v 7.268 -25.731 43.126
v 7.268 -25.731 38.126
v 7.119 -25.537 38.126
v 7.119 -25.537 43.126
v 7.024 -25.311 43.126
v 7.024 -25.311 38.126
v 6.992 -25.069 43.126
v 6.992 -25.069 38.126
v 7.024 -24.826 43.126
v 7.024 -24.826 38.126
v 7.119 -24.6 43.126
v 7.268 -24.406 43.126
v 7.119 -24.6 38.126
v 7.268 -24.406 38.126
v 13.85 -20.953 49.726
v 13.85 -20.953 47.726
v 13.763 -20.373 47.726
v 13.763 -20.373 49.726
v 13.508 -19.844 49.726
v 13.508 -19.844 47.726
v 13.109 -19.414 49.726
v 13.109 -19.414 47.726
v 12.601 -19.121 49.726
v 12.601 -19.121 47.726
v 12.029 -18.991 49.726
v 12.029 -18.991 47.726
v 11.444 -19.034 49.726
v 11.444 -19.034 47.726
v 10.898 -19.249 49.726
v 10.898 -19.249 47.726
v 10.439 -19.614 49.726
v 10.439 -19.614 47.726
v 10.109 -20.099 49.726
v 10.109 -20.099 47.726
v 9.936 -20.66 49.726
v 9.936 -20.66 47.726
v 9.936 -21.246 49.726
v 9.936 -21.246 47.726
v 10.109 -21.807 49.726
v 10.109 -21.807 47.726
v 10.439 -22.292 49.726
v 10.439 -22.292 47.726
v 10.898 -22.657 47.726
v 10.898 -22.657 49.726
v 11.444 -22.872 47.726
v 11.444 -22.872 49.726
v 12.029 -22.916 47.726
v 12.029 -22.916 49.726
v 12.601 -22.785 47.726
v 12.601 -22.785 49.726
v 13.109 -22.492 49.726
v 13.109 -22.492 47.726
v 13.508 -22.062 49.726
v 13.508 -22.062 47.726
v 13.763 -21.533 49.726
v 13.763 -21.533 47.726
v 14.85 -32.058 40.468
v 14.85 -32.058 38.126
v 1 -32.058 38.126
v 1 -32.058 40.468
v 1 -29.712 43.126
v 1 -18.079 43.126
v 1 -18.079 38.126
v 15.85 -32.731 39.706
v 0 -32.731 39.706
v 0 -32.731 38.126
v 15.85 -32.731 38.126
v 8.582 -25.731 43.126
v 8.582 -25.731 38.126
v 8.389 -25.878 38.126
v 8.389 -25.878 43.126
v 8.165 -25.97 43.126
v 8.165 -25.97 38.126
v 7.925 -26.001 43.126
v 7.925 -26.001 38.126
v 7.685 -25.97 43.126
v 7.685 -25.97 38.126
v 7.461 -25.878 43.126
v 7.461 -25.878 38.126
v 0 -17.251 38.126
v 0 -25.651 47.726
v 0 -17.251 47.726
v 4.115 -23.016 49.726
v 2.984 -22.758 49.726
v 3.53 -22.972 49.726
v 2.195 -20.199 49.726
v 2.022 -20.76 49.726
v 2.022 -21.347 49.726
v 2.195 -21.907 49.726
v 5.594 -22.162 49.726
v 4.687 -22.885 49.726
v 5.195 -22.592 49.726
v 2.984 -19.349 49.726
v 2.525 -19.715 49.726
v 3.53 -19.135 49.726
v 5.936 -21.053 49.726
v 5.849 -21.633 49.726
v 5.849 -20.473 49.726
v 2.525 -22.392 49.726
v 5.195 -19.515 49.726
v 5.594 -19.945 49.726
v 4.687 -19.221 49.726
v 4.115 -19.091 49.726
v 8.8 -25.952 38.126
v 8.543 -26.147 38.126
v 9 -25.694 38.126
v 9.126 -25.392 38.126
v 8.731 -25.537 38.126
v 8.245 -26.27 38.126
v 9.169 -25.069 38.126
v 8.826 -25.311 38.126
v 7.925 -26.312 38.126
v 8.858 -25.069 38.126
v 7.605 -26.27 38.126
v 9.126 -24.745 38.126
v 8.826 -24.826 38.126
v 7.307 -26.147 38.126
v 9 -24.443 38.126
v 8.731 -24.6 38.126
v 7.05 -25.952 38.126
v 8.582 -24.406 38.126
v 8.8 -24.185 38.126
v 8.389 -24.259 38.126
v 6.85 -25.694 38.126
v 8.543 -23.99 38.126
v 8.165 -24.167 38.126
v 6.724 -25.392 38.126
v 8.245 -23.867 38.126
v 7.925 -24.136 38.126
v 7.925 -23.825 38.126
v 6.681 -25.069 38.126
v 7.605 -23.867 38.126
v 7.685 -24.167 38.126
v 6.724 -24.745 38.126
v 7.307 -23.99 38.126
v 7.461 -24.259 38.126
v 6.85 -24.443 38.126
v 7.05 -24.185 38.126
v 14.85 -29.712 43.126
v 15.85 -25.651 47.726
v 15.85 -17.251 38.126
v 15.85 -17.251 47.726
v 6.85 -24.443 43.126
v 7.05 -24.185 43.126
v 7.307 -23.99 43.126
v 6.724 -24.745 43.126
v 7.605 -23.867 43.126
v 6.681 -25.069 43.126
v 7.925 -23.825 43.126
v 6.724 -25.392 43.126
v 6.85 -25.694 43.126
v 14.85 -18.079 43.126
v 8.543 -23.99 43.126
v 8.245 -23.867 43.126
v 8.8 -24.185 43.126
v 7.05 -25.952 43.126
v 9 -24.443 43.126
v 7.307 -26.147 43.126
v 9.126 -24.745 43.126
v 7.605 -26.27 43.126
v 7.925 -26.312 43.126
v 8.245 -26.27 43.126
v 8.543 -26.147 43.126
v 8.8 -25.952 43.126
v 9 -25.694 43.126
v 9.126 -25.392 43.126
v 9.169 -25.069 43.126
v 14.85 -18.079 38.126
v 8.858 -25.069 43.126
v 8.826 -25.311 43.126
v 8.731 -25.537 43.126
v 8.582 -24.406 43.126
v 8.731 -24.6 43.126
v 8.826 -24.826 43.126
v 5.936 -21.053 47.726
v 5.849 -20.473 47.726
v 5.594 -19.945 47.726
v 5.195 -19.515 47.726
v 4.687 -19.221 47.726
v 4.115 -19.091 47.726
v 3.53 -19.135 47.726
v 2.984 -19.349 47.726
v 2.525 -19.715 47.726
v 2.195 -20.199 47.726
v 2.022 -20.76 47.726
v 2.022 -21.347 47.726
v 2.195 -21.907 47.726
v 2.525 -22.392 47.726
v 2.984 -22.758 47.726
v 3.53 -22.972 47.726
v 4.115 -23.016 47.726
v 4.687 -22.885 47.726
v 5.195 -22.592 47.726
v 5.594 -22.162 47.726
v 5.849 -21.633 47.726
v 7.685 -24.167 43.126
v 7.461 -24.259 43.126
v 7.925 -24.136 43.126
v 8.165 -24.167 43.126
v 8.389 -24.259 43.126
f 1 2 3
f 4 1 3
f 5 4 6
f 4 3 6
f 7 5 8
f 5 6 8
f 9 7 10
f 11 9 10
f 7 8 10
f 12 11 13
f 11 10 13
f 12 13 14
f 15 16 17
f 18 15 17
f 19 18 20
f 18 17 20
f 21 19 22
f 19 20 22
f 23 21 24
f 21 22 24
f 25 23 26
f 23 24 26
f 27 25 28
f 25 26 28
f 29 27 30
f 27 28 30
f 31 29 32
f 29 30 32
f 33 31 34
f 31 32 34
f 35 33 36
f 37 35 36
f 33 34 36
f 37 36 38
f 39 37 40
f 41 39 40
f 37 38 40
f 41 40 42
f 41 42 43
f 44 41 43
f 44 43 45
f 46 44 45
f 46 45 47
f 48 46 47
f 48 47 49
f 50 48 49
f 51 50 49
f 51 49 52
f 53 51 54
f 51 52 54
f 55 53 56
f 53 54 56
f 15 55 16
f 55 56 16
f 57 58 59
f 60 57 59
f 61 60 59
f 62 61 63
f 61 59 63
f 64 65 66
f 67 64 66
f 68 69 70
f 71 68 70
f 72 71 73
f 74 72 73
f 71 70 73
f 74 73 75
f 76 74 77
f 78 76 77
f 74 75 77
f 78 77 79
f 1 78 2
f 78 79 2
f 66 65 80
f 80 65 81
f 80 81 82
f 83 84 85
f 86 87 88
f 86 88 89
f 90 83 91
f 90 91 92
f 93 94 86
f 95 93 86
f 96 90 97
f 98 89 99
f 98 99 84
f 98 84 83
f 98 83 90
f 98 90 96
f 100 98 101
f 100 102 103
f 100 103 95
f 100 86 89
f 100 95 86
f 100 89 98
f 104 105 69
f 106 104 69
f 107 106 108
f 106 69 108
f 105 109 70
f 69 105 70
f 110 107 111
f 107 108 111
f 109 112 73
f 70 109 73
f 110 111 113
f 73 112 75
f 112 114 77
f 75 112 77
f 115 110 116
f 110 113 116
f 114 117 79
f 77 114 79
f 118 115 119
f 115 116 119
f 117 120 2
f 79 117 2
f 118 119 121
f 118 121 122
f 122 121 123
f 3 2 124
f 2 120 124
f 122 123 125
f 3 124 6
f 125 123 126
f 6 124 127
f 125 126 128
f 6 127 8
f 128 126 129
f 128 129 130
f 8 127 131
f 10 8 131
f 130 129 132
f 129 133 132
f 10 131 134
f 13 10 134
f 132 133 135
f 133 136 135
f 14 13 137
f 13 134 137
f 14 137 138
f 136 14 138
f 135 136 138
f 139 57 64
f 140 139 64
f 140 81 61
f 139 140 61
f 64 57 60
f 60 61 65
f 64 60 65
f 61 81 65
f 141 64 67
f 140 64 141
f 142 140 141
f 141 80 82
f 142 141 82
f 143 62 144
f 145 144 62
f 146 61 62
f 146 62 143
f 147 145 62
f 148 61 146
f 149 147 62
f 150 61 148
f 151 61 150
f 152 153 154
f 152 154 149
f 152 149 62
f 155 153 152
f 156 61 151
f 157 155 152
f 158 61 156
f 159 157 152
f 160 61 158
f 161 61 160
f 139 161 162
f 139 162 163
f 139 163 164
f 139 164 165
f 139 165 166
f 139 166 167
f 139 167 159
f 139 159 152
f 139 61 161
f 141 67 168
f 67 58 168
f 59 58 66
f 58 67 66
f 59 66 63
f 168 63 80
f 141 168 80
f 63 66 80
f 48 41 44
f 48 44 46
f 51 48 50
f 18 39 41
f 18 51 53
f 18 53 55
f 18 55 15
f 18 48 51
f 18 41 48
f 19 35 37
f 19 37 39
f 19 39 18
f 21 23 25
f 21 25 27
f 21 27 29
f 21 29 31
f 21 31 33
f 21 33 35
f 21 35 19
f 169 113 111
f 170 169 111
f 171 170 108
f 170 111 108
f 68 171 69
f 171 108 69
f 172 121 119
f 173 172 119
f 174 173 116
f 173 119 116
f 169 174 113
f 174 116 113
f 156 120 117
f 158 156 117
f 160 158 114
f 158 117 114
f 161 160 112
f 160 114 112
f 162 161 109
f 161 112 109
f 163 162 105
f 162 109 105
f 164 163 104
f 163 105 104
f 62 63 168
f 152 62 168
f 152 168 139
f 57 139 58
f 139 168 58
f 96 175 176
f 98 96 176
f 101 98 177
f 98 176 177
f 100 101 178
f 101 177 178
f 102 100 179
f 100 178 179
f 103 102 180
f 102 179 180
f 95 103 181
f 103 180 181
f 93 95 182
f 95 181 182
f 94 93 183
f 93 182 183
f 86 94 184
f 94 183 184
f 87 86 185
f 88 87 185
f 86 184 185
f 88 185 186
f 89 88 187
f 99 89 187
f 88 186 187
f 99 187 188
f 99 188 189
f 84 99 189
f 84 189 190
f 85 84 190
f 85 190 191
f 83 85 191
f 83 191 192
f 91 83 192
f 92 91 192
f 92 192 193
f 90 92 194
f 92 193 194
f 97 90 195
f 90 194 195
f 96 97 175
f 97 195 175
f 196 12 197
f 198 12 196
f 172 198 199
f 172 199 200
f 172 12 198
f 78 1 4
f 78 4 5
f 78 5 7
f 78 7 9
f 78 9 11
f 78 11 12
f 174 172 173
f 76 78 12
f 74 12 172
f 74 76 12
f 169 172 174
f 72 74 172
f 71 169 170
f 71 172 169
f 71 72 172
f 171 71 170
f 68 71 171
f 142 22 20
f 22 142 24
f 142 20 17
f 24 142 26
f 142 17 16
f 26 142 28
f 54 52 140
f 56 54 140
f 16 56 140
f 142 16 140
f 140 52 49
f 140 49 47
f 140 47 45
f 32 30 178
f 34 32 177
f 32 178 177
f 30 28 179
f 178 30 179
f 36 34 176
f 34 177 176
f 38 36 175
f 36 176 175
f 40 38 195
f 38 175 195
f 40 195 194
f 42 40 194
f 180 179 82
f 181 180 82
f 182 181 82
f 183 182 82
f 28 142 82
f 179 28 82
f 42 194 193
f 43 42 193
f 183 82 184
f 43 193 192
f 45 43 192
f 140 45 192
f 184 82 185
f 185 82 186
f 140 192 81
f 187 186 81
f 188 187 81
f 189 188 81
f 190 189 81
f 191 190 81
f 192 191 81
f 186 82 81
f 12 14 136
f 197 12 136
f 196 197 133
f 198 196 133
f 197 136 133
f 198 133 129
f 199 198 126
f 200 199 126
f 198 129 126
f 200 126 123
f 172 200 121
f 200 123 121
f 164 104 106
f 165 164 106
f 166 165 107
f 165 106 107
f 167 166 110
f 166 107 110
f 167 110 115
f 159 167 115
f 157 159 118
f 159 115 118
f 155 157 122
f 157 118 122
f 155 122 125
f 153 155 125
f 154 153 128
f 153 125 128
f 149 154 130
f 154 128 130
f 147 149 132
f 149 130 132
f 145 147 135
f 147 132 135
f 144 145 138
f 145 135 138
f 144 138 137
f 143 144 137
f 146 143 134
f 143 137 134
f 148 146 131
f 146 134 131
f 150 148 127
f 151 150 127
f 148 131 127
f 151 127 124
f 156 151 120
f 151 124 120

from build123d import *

# Parameters (mm, degrees)
F1_DEPTH = 15.85
F2_R     = 1.9679985055
F2_R_2   = 1.968
F3_DEPTH = 2
F5_DEPTH = 5


with BuildPart() as f1:
    # F0 (on Right) → F1 (new body)
    with BuildSketch(Plane.YZ):
        Polygon((-17.2513356102, 38.1256241769), (-17.2513356102, 47.7256241769), (-25.6513356102, 47.7256241769), (-32.7313356102, 39.7056241769), (-32.7313356102, 38.1256241769), align=None)
    extrude(amount=F1_DEPTH)

    # F2 (on face) → F3 (join)
    with BuildSketch(Plane.XY.offset(47.7256241769)):
        with Locations((3.9679985055, -21.0531856865)):
            Circle(F2_R)
        with Locations((11.882, -20.9530331194)):
            Circle(F2_R_2)
    extrude(amount=F3_DEPTH)

    # F4 (on face) → F5 (cut)
    with BuildSketch(Plane(origin=(0, 0, 38.1256241769), x_dir=(1, 0, 0), z_dir=(0, 0, -1))):
        with BuildLine():
            Line((7.0497745559, 25.9519131103), (1, 32.0581247445))
            Line((1, 32.0581247445), (1, 18.0789209985))
            Line((1, 18.0789209985), (7.0497745559, 24.1851326327))
            ThreePointArc((7.0497745559, 24.1851326327), (6.6814575231, 25.0685228715), (7.0497745559, 25.9519131103))
        make_face()
        with BuildLine():
            Line((14.85, 32.0581247445), (1, 32.0581247445))
            Line((1, 32.0581247445), (7.0497745559, 25.9519131103))
            ThreePointArc((7.0497745559, 25.9519131103), (7.925, 26.3120653484), (8.8002254441, 25.9519131103))
            Line((8.8002254441, 25.9519131103), (14.85, 32.0581247445))
        make_face()
        with BuildLine():
            Line((14.85, 21.5539868837), (14.85, 32.0581247445))
            Line((14.85, 32.0581247445), (8.8002254441, 25.9519131103))
            ThreePointArc((8.8002254441, 25.9519131103), (9.072775655, 25.5470716544), (9.1685424769, 25.0685228715))
            ThreePointArc((9.1685424769, 25.0685228715), (9.072775655, 24.5899740886), (8.8002254441, 24.1851326327))
            Line((8.8002254441, 24.1851326327), (14.85, 18.0789209985))
            Line((14.85, 18.0789209985), (14.85, 21.5539868837))
        make_face()
        with BuildLine():
            Line((7.0497745559, 24.1851326327), (1, 18.0789209985))
            Line((1, 18.0789209985), (14.85, 18.0789209985))
            Line((14.85, 18.0789209985), (8.8002254441, 24.1851326327))
            ThreePointArc((8.8002254441, 24.1851326327), (7.925, 23.8249803946), (7.0497745559, 24.1851326327))
        make_face()
        with BuildLine():
            Line((7.925, 25.0685228715), (7.2684074253, 24.4058050824))
            ThreePointArc((7.2684074253, 24.4058050824), (7.925, 24.1356195125), (8.5815925747, 24.4058050824))
            Line((8.5815925747, 24.4058050824), (7.925, 25.0685228715))
        make_face()
        with BuildLine():
            Line((7.925, 25.0685228715), (7.2684074253, 25.7312406607))
            ThreePointArc((7.2684074253, 25.7312406607), (6.992096641, 25.0685228715), (7.2684074253, 24.4058050824))
            Line((7.2684074253, 24.4058050824), (7.925, 25.0685228715))
        make_face()
        with BuildLine():
            ThreePointArc((8.5815925747, 25.7312406607), (7.925, 26.0014262305), (7.2684074253, 25.7312406607))
            Line((7.2684074253, 25.7312406607), (7.925, 25.0685228715))
            Line((7.925, 25.0685228715), (8.5815925747, 25.7312406607))
        make_face()
        with BuildLine():
            ThreePointArc((8.857903359, 25.0685228715), (8.7860592592, 25.4275293191), (8.5815925747, 25.7312406607))
            Line((8.5815925747, 25.7312406607), (7.925, 25.0685228715))
            Line((7.925, 25.0685228715), (8.5815925747, 24.4058050824))
            ThreePointArc((8.5815925747, 24.4058050824), (8.7860592592, 24.7095164239), (8.857903359, 25.0685228715))
        make_face()
    extrude(amount=-F5_DEPTH, mode=Mode.SUBTRACT)


solid = f1.part
